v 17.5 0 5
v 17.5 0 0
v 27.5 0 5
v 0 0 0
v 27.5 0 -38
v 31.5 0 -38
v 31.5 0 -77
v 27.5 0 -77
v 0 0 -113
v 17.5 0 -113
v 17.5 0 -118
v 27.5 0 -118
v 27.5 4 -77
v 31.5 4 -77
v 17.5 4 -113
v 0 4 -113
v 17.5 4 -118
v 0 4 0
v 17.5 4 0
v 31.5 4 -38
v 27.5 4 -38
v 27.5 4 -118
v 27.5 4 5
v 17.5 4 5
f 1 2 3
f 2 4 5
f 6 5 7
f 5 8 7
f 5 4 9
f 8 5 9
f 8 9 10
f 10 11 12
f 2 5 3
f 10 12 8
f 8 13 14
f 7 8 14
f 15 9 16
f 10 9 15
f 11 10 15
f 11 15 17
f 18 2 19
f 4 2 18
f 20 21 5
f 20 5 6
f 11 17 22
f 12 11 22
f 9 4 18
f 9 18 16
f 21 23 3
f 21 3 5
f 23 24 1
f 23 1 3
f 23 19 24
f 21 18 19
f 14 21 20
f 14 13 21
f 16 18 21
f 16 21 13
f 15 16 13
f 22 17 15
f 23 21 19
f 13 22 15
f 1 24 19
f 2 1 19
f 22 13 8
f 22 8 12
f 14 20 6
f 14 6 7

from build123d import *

# Parameters (mm, degrees)
BOSS_EXTRUDE1_DEPTH = 4
SKETCH2_W           = 10
SKETCH2_H           = 4
BOSS_EXTRUDE2_DEPTH = 4
SKETCH3_W           = 4
SKETCH3_H           = 39
BOSS_EXTRUDE3_DEPTH = 4


with BuildPart() as part:
    # Sketch1 → Boss-Extrude1 (new body)
    with BuildSketch(Plane(origin=(0, 0, 0), x_dir=(1, 0, 0), z_dir=(0, 1, 0))):
        Polygon((17.5, 113), (17.5, 114), (27.5, 114), (27.5, -1), (17.5, -1), (17.5, 0), (0, 0), (0, 113), align=None)
    extrude(amount=BOSS_EXTRUDE1_DEPTH)

    # Sketch2 → Boss-Extrude2 (add)
    with BuildSketch(Plane(origin=(0, 4, 0), x_dir=(1, 0, 0), z_dir=(0, 1, 0))):
        with Locations((22.5, -3)):
            Rectangle(SKETCH2_W, SKETCH2_H)
        with Locations((22.5, 116)):
            Rectangle(SKETCH2_W, SKETCH2_H)
    extrude(amount=-BOSS_EXTRUDE2_DEPTH)

    # Sketch3 → Boss-Extrude3 (add)
    with BuildSketch(Plane(origin=(0, 4, 0), x_dir=(1, 0, 0), z_dir=(0, 1, 0))):
        with Locations((29.5, 57.5)):
            Rectangle(SKETCH3_W, SKETCH3_H)
    extrude(amount=-BOSS_EXTRUDE3_DEPTH)


solid = part.part
